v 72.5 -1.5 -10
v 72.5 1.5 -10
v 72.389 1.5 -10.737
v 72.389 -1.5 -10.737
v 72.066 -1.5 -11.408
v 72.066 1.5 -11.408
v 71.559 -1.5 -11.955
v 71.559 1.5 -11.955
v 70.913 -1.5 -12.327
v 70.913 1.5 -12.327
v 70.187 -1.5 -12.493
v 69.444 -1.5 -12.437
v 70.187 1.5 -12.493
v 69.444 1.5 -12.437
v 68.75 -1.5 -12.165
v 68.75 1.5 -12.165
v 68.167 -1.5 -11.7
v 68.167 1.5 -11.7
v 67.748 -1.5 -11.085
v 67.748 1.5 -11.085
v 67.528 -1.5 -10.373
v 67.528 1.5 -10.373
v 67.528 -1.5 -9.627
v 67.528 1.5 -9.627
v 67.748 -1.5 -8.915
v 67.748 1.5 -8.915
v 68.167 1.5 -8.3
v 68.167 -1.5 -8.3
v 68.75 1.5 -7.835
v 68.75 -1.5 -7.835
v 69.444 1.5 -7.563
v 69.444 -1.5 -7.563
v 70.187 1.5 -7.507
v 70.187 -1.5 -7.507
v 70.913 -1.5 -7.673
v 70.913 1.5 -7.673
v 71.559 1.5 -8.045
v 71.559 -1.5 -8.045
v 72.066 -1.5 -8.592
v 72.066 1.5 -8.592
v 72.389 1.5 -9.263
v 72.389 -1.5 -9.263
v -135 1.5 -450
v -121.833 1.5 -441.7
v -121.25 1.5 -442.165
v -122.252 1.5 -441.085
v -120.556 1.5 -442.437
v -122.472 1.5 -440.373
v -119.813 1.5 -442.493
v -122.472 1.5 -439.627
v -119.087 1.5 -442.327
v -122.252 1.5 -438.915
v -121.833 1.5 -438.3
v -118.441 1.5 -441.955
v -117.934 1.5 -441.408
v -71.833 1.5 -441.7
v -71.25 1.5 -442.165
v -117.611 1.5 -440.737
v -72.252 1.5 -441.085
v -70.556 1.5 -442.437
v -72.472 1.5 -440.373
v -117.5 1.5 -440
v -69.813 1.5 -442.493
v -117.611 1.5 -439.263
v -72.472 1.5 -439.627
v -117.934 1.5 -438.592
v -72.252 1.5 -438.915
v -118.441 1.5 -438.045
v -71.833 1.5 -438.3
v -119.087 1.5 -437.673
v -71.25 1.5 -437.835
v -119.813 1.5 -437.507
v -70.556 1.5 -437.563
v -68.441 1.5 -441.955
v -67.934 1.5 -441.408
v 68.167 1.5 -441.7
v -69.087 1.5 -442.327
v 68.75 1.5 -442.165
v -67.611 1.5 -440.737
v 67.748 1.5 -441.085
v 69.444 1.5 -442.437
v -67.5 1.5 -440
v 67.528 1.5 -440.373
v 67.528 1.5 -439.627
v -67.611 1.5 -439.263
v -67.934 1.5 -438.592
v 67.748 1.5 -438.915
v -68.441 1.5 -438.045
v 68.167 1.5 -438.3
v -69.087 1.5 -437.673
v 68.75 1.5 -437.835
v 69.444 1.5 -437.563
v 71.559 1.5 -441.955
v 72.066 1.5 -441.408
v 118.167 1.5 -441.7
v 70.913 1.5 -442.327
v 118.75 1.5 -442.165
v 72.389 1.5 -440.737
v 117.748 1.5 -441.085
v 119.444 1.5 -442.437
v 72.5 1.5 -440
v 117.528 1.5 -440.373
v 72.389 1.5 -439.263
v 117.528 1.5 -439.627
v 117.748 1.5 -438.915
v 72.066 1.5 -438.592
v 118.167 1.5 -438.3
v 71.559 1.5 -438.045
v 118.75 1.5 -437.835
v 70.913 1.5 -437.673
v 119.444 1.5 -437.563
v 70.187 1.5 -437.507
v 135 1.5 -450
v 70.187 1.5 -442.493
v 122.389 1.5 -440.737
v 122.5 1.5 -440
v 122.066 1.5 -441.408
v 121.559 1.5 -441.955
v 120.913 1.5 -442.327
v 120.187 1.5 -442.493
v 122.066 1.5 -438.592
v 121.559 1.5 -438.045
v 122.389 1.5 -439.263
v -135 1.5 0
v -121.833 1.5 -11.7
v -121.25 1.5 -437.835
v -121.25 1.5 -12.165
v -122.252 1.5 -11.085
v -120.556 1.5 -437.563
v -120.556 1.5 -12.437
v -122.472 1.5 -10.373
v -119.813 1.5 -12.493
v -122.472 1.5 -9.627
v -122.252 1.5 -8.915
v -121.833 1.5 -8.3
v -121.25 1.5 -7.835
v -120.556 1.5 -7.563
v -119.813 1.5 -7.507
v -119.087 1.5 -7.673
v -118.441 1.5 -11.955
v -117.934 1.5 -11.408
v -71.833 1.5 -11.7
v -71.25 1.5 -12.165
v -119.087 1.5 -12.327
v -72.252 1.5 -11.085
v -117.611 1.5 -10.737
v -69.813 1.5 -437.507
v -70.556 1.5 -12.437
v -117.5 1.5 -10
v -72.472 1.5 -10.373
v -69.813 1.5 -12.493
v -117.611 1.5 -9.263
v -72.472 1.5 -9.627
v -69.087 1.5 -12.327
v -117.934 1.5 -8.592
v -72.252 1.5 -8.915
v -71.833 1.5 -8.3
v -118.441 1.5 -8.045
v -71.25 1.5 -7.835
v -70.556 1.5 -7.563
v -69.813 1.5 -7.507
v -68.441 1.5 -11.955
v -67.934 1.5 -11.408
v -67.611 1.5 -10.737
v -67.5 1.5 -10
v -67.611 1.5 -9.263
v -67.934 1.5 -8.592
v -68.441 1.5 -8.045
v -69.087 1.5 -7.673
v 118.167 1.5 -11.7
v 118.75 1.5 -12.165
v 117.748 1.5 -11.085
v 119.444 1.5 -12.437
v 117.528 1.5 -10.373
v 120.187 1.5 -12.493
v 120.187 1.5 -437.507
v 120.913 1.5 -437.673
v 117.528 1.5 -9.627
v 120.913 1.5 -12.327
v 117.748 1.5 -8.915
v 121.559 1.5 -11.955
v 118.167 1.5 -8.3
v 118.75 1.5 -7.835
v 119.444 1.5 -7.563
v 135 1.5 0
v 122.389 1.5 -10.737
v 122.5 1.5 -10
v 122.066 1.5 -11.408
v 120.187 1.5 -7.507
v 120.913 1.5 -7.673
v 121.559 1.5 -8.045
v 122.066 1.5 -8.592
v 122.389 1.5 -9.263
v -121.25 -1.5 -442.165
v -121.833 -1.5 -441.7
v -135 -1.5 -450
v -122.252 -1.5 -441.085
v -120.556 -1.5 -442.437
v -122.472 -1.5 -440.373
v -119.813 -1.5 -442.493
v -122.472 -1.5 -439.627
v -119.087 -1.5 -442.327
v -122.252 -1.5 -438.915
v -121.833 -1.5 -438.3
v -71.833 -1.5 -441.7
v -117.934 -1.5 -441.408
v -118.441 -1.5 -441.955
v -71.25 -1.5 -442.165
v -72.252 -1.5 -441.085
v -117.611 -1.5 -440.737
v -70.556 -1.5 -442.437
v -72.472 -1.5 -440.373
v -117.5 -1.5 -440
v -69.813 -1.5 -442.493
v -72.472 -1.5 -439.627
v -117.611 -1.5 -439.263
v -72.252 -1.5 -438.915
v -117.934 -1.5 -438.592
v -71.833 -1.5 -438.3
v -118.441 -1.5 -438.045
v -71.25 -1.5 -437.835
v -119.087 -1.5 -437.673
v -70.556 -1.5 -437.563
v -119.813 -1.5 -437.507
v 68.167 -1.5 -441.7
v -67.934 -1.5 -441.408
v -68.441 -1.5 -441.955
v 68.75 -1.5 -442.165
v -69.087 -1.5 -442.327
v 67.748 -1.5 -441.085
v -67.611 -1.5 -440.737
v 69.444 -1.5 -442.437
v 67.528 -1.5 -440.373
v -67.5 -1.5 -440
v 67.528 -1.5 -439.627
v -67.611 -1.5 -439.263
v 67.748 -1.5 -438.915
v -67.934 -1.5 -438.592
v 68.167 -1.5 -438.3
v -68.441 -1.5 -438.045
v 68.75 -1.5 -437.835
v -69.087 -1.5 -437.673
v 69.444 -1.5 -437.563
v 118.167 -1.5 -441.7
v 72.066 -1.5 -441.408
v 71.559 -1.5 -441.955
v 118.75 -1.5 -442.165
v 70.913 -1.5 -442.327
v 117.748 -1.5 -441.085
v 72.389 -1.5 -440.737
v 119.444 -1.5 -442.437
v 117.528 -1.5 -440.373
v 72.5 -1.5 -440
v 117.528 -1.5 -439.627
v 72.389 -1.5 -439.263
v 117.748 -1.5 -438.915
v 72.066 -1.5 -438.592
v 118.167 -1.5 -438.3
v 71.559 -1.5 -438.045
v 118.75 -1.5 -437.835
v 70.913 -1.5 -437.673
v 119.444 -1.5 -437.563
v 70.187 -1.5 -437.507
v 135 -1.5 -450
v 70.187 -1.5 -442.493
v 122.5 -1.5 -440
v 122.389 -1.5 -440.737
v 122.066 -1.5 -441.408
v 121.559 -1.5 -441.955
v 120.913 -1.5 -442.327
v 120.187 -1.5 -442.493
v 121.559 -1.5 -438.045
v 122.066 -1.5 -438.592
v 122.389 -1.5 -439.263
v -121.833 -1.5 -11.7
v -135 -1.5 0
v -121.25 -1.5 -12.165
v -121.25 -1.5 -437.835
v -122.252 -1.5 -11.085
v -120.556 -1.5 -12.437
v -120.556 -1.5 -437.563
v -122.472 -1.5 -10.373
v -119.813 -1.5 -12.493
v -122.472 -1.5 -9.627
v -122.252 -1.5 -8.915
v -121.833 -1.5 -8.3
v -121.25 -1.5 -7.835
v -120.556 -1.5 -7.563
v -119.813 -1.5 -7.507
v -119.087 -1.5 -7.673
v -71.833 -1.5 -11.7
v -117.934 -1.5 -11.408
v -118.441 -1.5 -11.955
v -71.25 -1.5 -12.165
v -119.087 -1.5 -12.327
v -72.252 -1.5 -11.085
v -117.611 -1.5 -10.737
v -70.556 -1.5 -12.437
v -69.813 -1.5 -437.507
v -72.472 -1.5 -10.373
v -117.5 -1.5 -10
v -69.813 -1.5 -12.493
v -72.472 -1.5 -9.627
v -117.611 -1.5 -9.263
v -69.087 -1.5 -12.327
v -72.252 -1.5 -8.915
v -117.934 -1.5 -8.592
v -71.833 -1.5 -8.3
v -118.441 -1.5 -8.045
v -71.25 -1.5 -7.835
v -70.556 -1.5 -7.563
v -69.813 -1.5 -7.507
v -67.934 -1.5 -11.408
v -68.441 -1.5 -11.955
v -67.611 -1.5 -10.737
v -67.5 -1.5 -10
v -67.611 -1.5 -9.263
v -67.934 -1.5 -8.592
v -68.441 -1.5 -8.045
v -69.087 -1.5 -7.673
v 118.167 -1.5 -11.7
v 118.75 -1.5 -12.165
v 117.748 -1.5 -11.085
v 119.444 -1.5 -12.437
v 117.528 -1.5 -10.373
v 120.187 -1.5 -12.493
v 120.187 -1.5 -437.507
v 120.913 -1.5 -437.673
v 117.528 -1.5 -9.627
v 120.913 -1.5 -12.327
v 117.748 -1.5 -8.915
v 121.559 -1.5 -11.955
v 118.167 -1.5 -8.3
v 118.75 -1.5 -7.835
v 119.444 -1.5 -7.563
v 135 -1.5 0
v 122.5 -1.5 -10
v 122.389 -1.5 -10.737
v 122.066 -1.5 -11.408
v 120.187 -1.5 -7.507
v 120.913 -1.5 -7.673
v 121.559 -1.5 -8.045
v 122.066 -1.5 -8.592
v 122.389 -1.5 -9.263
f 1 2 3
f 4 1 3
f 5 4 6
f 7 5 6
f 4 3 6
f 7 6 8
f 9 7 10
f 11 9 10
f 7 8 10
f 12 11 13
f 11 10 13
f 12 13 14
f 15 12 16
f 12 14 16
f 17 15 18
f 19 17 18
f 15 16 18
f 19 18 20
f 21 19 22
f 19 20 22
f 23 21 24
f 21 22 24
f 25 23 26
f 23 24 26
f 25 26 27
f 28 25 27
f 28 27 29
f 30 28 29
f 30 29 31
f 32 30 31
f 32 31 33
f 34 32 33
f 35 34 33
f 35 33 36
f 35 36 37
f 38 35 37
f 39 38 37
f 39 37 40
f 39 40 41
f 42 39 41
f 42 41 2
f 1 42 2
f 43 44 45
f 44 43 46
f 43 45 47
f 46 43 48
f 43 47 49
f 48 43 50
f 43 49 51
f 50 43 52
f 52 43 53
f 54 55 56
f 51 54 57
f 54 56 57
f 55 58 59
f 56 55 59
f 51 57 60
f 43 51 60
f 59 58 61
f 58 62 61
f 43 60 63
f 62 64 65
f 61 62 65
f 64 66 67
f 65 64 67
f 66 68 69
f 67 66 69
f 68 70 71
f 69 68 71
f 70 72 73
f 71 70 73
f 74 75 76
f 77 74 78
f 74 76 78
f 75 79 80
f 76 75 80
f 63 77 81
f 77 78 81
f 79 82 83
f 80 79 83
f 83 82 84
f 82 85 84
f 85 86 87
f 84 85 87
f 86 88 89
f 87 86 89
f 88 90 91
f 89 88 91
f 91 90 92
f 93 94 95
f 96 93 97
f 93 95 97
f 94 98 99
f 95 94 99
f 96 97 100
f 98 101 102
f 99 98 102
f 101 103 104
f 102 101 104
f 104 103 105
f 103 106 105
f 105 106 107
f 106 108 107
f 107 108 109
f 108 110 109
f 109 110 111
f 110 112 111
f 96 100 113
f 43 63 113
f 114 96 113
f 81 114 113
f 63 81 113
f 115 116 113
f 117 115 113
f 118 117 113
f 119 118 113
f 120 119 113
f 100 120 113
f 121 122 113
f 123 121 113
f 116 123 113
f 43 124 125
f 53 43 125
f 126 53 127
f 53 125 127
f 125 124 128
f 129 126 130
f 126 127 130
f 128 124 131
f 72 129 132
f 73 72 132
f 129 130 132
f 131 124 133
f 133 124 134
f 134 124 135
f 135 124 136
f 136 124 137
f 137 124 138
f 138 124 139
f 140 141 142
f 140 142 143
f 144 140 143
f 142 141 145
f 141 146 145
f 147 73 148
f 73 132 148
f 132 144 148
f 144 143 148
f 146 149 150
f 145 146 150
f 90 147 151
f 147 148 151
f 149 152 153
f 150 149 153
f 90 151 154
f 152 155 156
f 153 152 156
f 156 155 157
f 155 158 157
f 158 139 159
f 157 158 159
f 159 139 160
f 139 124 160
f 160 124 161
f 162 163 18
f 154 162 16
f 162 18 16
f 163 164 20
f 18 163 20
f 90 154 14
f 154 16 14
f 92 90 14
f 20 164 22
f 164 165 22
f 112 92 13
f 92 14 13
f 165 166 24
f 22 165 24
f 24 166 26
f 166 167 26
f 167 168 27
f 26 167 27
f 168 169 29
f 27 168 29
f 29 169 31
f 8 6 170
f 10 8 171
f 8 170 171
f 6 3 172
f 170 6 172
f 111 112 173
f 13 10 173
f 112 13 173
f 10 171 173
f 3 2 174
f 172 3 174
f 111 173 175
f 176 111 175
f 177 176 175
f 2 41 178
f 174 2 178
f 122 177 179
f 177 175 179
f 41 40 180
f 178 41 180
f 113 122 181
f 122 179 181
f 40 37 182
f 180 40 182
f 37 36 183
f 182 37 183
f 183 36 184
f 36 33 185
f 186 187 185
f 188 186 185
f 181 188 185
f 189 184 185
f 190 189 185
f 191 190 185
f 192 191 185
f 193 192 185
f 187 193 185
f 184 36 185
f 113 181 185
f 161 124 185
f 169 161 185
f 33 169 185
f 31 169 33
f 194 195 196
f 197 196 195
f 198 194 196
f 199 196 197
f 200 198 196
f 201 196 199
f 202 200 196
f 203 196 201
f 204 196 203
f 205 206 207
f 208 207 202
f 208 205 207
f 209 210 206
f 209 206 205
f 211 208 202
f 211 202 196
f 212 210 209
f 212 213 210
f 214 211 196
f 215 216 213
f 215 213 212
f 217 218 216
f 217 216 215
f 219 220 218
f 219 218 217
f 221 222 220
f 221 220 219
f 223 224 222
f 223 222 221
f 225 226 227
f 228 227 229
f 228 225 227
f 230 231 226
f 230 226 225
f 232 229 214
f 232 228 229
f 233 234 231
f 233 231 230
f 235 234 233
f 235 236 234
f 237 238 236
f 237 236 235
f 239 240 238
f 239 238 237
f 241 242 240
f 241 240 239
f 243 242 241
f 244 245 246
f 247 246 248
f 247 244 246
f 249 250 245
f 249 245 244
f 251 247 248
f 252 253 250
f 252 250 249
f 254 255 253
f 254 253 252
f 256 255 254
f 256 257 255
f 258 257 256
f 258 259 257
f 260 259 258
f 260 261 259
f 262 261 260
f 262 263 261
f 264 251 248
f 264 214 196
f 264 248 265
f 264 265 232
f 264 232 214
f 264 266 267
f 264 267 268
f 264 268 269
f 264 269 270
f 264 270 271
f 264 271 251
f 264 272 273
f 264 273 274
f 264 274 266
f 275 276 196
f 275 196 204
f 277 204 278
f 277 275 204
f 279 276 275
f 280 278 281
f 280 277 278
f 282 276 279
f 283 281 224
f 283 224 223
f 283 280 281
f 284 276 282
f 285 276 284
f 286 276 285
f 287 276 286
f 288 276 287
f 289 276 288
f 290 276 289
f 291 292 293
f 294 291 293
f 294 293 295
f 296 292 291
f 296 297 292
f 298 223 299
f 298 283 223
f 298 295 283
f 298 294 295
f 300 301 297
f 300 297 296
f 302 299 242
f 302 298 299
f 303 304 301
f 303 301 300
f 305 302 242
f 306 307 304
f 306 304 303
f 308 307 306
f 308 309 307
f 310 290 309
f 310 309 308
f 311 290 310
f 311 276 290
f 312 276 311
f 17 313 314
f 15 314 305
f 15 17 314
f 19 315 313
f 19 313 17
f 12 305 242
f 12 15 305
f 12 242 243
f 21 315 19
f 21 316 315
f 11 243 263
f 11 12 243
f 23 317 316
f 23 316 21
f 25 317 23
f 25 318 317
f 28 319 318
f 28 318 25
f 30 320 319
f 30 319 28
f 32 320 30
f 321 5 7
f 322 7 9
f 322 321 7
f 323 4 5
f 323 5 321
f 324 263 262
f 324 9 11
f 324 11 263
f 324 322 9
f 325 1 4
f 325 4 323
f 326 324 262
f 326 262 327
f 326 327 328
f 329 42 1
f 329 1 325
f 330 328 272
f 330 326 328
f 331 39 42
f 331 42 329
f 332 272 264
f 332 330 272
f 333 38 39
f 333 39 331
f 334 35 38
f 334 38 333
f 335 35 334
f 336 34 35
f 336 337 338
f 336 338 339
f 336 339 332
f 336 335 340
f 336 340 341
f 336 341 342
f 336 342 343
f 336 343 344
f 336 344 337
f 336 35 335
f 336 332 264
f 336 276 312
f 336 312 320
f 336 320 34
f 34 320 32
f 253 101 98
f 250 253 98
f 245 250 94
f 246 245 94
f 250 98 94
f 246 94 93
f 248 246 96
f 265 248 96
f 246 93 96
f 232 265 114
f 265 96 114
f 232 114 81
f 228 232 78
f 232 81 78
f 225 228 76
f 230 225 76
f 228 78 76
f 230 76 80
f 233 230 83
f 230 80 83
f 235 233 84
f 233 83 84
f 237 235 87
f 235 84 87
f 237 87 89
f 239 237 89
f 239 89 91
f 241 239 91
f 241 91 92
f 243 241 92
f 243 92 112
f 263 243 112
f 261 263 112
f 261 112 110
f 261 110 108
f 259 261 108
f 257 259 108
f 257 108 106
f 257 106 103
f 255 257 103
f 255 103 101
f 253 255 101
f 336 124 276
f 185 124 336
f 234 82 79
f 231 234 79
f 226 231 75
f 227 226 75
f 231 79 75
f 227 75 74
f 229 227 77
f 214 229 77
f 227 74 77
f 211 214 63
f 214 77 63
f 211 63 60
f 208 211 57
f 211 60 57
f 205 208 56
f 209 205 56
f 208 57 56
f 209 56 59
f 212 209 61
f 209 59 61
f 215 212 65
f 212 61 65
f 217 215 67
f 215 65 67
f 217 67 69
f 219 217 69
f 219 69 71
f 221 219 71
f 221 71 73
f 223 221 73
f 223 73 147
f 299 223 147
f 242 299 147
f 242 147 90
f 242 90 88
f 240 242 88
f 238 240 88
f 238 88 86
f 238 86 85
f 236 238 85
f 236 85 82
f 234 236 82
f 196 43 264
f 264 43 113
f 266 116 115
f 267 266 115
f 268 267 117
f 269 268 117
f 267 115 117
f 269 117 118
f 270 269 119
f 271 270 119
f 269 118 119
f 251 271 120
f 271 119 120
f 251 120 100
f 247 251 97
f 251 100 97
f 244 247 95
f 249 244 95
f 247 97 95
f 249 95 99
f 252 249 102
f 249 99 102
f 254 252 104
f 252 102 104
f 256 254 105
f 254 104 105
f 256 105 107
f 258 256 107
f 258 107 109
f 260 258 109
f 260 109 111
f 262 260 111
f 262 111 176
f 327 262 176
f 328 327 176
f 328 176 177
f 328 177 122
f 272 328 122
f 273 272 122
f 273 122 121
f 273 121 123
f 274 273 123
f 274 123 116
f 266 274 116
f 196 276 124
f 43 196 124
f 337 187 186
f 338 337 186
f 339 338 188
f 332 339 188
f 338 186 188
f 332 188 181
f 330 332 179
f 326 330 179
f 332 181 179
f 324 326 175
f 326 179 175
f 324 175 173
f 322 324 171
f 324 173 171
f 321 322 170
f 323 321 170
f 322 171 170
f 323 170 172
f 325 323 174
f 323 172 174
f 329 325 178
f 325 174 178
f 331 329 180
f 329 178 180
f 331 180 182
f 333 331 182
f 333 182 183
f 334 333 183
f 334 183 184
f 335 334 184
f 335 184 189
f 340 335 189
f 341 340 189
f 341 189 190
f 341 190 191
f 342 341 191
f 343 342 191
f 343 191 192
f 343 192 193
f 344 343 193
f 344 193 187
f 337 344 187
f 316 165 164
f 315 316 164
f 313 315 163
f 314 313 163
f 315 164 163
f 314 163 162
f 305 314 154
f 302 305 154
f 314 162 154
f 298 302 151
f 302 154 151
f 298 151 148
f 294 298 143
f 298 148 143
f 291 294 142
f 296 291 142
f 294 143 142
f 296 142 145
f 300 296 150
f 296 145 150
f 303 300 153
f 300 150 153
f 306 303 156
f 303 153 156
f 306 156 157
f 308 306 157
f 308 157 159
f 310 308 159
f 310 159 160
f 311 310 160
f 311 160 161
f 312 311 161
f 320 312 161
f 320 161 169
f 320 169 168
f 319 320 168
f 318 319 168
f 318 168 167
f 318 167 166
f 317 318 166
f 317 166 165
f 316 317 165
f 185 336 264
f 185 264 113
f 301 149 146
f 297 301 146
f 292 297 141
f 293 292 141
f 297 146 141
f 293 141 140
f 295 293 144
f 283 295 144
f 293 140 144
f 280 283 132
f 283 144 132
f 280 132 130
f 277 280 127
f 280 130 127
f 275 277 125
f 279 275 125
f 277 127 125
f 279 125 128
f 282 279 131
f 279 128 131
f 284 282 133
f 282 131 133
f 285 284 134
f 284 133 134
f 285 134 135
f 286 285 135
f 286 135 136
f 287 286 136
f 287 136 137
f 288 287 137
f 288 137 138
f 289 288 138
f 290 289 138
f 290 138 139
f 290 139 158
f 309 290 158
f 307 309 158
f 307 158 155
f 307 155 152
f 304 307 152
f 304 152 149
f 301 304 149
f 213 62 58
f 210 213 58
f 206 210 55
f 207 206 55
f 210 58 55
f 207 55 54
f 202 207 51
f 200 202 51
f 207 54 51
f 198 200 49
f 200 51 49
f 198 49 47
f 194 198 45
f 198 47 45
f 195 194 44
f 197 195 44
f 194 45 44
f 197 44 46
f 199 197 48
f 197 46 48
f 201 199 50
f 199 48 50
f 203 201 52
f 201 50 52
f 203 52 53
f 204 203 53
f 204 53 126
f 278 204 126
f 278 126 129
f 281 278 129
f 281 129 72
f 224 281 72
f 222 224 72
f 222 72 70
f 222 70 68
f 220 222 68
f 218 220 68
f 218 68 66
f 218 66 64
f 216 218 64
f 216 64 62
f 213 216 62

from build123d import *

# Parameters (mm, degrees)
SKETCH1_W           = 270
SKETCH1_H           = 3
BOSS_EXTRUDE1_DEPTH = 450
SKETCH2_R           = 2.5
CUT_EXTRUDE1_DEPTH  = 4


with BuildPart() as part:
    # Sketch1 → Boss-Extrude1 (new body)
    with BuildSketch(Plane.XY):
        Rectangle(SKETCH1_W, SKETCH1_H)
    extrude(amount=-BOSS_EXTRUDE1_DEPTH)

    # Sketch2 → Cut-Extrude1 (cut, through all)
    with BuildSketch(Plane(origin=(0, 1.5, 0), x_dir=(1, 0, 0), z_dir=(0, 1, 0))):
        with Locations((-120, 440)):
            Circle(SKETCH2_R)
        with Locations((-70, 440)):
            Circle(SKETCH2_R)
        with Locations((70, 440)):
            Circle(SKETCH2_R)
        with Locations((120, 440)):
            Circle(SKETCH2_R)
        with Locations((120, 10)):
            Circle(SKETCH2_R)
        with Locations((70, 10)):
            Circle(SKETCH2_R)
        with Locations((-70, 10)):
            Circle(SKETCH2_R)
        with Locations((-120, 10)):
            Circle(SKETCH2_R)
    extrude(amount=-CUT_EXTRUDE1_DEPTH, mode=Mode.SUBTRACT)


solid = part.part
